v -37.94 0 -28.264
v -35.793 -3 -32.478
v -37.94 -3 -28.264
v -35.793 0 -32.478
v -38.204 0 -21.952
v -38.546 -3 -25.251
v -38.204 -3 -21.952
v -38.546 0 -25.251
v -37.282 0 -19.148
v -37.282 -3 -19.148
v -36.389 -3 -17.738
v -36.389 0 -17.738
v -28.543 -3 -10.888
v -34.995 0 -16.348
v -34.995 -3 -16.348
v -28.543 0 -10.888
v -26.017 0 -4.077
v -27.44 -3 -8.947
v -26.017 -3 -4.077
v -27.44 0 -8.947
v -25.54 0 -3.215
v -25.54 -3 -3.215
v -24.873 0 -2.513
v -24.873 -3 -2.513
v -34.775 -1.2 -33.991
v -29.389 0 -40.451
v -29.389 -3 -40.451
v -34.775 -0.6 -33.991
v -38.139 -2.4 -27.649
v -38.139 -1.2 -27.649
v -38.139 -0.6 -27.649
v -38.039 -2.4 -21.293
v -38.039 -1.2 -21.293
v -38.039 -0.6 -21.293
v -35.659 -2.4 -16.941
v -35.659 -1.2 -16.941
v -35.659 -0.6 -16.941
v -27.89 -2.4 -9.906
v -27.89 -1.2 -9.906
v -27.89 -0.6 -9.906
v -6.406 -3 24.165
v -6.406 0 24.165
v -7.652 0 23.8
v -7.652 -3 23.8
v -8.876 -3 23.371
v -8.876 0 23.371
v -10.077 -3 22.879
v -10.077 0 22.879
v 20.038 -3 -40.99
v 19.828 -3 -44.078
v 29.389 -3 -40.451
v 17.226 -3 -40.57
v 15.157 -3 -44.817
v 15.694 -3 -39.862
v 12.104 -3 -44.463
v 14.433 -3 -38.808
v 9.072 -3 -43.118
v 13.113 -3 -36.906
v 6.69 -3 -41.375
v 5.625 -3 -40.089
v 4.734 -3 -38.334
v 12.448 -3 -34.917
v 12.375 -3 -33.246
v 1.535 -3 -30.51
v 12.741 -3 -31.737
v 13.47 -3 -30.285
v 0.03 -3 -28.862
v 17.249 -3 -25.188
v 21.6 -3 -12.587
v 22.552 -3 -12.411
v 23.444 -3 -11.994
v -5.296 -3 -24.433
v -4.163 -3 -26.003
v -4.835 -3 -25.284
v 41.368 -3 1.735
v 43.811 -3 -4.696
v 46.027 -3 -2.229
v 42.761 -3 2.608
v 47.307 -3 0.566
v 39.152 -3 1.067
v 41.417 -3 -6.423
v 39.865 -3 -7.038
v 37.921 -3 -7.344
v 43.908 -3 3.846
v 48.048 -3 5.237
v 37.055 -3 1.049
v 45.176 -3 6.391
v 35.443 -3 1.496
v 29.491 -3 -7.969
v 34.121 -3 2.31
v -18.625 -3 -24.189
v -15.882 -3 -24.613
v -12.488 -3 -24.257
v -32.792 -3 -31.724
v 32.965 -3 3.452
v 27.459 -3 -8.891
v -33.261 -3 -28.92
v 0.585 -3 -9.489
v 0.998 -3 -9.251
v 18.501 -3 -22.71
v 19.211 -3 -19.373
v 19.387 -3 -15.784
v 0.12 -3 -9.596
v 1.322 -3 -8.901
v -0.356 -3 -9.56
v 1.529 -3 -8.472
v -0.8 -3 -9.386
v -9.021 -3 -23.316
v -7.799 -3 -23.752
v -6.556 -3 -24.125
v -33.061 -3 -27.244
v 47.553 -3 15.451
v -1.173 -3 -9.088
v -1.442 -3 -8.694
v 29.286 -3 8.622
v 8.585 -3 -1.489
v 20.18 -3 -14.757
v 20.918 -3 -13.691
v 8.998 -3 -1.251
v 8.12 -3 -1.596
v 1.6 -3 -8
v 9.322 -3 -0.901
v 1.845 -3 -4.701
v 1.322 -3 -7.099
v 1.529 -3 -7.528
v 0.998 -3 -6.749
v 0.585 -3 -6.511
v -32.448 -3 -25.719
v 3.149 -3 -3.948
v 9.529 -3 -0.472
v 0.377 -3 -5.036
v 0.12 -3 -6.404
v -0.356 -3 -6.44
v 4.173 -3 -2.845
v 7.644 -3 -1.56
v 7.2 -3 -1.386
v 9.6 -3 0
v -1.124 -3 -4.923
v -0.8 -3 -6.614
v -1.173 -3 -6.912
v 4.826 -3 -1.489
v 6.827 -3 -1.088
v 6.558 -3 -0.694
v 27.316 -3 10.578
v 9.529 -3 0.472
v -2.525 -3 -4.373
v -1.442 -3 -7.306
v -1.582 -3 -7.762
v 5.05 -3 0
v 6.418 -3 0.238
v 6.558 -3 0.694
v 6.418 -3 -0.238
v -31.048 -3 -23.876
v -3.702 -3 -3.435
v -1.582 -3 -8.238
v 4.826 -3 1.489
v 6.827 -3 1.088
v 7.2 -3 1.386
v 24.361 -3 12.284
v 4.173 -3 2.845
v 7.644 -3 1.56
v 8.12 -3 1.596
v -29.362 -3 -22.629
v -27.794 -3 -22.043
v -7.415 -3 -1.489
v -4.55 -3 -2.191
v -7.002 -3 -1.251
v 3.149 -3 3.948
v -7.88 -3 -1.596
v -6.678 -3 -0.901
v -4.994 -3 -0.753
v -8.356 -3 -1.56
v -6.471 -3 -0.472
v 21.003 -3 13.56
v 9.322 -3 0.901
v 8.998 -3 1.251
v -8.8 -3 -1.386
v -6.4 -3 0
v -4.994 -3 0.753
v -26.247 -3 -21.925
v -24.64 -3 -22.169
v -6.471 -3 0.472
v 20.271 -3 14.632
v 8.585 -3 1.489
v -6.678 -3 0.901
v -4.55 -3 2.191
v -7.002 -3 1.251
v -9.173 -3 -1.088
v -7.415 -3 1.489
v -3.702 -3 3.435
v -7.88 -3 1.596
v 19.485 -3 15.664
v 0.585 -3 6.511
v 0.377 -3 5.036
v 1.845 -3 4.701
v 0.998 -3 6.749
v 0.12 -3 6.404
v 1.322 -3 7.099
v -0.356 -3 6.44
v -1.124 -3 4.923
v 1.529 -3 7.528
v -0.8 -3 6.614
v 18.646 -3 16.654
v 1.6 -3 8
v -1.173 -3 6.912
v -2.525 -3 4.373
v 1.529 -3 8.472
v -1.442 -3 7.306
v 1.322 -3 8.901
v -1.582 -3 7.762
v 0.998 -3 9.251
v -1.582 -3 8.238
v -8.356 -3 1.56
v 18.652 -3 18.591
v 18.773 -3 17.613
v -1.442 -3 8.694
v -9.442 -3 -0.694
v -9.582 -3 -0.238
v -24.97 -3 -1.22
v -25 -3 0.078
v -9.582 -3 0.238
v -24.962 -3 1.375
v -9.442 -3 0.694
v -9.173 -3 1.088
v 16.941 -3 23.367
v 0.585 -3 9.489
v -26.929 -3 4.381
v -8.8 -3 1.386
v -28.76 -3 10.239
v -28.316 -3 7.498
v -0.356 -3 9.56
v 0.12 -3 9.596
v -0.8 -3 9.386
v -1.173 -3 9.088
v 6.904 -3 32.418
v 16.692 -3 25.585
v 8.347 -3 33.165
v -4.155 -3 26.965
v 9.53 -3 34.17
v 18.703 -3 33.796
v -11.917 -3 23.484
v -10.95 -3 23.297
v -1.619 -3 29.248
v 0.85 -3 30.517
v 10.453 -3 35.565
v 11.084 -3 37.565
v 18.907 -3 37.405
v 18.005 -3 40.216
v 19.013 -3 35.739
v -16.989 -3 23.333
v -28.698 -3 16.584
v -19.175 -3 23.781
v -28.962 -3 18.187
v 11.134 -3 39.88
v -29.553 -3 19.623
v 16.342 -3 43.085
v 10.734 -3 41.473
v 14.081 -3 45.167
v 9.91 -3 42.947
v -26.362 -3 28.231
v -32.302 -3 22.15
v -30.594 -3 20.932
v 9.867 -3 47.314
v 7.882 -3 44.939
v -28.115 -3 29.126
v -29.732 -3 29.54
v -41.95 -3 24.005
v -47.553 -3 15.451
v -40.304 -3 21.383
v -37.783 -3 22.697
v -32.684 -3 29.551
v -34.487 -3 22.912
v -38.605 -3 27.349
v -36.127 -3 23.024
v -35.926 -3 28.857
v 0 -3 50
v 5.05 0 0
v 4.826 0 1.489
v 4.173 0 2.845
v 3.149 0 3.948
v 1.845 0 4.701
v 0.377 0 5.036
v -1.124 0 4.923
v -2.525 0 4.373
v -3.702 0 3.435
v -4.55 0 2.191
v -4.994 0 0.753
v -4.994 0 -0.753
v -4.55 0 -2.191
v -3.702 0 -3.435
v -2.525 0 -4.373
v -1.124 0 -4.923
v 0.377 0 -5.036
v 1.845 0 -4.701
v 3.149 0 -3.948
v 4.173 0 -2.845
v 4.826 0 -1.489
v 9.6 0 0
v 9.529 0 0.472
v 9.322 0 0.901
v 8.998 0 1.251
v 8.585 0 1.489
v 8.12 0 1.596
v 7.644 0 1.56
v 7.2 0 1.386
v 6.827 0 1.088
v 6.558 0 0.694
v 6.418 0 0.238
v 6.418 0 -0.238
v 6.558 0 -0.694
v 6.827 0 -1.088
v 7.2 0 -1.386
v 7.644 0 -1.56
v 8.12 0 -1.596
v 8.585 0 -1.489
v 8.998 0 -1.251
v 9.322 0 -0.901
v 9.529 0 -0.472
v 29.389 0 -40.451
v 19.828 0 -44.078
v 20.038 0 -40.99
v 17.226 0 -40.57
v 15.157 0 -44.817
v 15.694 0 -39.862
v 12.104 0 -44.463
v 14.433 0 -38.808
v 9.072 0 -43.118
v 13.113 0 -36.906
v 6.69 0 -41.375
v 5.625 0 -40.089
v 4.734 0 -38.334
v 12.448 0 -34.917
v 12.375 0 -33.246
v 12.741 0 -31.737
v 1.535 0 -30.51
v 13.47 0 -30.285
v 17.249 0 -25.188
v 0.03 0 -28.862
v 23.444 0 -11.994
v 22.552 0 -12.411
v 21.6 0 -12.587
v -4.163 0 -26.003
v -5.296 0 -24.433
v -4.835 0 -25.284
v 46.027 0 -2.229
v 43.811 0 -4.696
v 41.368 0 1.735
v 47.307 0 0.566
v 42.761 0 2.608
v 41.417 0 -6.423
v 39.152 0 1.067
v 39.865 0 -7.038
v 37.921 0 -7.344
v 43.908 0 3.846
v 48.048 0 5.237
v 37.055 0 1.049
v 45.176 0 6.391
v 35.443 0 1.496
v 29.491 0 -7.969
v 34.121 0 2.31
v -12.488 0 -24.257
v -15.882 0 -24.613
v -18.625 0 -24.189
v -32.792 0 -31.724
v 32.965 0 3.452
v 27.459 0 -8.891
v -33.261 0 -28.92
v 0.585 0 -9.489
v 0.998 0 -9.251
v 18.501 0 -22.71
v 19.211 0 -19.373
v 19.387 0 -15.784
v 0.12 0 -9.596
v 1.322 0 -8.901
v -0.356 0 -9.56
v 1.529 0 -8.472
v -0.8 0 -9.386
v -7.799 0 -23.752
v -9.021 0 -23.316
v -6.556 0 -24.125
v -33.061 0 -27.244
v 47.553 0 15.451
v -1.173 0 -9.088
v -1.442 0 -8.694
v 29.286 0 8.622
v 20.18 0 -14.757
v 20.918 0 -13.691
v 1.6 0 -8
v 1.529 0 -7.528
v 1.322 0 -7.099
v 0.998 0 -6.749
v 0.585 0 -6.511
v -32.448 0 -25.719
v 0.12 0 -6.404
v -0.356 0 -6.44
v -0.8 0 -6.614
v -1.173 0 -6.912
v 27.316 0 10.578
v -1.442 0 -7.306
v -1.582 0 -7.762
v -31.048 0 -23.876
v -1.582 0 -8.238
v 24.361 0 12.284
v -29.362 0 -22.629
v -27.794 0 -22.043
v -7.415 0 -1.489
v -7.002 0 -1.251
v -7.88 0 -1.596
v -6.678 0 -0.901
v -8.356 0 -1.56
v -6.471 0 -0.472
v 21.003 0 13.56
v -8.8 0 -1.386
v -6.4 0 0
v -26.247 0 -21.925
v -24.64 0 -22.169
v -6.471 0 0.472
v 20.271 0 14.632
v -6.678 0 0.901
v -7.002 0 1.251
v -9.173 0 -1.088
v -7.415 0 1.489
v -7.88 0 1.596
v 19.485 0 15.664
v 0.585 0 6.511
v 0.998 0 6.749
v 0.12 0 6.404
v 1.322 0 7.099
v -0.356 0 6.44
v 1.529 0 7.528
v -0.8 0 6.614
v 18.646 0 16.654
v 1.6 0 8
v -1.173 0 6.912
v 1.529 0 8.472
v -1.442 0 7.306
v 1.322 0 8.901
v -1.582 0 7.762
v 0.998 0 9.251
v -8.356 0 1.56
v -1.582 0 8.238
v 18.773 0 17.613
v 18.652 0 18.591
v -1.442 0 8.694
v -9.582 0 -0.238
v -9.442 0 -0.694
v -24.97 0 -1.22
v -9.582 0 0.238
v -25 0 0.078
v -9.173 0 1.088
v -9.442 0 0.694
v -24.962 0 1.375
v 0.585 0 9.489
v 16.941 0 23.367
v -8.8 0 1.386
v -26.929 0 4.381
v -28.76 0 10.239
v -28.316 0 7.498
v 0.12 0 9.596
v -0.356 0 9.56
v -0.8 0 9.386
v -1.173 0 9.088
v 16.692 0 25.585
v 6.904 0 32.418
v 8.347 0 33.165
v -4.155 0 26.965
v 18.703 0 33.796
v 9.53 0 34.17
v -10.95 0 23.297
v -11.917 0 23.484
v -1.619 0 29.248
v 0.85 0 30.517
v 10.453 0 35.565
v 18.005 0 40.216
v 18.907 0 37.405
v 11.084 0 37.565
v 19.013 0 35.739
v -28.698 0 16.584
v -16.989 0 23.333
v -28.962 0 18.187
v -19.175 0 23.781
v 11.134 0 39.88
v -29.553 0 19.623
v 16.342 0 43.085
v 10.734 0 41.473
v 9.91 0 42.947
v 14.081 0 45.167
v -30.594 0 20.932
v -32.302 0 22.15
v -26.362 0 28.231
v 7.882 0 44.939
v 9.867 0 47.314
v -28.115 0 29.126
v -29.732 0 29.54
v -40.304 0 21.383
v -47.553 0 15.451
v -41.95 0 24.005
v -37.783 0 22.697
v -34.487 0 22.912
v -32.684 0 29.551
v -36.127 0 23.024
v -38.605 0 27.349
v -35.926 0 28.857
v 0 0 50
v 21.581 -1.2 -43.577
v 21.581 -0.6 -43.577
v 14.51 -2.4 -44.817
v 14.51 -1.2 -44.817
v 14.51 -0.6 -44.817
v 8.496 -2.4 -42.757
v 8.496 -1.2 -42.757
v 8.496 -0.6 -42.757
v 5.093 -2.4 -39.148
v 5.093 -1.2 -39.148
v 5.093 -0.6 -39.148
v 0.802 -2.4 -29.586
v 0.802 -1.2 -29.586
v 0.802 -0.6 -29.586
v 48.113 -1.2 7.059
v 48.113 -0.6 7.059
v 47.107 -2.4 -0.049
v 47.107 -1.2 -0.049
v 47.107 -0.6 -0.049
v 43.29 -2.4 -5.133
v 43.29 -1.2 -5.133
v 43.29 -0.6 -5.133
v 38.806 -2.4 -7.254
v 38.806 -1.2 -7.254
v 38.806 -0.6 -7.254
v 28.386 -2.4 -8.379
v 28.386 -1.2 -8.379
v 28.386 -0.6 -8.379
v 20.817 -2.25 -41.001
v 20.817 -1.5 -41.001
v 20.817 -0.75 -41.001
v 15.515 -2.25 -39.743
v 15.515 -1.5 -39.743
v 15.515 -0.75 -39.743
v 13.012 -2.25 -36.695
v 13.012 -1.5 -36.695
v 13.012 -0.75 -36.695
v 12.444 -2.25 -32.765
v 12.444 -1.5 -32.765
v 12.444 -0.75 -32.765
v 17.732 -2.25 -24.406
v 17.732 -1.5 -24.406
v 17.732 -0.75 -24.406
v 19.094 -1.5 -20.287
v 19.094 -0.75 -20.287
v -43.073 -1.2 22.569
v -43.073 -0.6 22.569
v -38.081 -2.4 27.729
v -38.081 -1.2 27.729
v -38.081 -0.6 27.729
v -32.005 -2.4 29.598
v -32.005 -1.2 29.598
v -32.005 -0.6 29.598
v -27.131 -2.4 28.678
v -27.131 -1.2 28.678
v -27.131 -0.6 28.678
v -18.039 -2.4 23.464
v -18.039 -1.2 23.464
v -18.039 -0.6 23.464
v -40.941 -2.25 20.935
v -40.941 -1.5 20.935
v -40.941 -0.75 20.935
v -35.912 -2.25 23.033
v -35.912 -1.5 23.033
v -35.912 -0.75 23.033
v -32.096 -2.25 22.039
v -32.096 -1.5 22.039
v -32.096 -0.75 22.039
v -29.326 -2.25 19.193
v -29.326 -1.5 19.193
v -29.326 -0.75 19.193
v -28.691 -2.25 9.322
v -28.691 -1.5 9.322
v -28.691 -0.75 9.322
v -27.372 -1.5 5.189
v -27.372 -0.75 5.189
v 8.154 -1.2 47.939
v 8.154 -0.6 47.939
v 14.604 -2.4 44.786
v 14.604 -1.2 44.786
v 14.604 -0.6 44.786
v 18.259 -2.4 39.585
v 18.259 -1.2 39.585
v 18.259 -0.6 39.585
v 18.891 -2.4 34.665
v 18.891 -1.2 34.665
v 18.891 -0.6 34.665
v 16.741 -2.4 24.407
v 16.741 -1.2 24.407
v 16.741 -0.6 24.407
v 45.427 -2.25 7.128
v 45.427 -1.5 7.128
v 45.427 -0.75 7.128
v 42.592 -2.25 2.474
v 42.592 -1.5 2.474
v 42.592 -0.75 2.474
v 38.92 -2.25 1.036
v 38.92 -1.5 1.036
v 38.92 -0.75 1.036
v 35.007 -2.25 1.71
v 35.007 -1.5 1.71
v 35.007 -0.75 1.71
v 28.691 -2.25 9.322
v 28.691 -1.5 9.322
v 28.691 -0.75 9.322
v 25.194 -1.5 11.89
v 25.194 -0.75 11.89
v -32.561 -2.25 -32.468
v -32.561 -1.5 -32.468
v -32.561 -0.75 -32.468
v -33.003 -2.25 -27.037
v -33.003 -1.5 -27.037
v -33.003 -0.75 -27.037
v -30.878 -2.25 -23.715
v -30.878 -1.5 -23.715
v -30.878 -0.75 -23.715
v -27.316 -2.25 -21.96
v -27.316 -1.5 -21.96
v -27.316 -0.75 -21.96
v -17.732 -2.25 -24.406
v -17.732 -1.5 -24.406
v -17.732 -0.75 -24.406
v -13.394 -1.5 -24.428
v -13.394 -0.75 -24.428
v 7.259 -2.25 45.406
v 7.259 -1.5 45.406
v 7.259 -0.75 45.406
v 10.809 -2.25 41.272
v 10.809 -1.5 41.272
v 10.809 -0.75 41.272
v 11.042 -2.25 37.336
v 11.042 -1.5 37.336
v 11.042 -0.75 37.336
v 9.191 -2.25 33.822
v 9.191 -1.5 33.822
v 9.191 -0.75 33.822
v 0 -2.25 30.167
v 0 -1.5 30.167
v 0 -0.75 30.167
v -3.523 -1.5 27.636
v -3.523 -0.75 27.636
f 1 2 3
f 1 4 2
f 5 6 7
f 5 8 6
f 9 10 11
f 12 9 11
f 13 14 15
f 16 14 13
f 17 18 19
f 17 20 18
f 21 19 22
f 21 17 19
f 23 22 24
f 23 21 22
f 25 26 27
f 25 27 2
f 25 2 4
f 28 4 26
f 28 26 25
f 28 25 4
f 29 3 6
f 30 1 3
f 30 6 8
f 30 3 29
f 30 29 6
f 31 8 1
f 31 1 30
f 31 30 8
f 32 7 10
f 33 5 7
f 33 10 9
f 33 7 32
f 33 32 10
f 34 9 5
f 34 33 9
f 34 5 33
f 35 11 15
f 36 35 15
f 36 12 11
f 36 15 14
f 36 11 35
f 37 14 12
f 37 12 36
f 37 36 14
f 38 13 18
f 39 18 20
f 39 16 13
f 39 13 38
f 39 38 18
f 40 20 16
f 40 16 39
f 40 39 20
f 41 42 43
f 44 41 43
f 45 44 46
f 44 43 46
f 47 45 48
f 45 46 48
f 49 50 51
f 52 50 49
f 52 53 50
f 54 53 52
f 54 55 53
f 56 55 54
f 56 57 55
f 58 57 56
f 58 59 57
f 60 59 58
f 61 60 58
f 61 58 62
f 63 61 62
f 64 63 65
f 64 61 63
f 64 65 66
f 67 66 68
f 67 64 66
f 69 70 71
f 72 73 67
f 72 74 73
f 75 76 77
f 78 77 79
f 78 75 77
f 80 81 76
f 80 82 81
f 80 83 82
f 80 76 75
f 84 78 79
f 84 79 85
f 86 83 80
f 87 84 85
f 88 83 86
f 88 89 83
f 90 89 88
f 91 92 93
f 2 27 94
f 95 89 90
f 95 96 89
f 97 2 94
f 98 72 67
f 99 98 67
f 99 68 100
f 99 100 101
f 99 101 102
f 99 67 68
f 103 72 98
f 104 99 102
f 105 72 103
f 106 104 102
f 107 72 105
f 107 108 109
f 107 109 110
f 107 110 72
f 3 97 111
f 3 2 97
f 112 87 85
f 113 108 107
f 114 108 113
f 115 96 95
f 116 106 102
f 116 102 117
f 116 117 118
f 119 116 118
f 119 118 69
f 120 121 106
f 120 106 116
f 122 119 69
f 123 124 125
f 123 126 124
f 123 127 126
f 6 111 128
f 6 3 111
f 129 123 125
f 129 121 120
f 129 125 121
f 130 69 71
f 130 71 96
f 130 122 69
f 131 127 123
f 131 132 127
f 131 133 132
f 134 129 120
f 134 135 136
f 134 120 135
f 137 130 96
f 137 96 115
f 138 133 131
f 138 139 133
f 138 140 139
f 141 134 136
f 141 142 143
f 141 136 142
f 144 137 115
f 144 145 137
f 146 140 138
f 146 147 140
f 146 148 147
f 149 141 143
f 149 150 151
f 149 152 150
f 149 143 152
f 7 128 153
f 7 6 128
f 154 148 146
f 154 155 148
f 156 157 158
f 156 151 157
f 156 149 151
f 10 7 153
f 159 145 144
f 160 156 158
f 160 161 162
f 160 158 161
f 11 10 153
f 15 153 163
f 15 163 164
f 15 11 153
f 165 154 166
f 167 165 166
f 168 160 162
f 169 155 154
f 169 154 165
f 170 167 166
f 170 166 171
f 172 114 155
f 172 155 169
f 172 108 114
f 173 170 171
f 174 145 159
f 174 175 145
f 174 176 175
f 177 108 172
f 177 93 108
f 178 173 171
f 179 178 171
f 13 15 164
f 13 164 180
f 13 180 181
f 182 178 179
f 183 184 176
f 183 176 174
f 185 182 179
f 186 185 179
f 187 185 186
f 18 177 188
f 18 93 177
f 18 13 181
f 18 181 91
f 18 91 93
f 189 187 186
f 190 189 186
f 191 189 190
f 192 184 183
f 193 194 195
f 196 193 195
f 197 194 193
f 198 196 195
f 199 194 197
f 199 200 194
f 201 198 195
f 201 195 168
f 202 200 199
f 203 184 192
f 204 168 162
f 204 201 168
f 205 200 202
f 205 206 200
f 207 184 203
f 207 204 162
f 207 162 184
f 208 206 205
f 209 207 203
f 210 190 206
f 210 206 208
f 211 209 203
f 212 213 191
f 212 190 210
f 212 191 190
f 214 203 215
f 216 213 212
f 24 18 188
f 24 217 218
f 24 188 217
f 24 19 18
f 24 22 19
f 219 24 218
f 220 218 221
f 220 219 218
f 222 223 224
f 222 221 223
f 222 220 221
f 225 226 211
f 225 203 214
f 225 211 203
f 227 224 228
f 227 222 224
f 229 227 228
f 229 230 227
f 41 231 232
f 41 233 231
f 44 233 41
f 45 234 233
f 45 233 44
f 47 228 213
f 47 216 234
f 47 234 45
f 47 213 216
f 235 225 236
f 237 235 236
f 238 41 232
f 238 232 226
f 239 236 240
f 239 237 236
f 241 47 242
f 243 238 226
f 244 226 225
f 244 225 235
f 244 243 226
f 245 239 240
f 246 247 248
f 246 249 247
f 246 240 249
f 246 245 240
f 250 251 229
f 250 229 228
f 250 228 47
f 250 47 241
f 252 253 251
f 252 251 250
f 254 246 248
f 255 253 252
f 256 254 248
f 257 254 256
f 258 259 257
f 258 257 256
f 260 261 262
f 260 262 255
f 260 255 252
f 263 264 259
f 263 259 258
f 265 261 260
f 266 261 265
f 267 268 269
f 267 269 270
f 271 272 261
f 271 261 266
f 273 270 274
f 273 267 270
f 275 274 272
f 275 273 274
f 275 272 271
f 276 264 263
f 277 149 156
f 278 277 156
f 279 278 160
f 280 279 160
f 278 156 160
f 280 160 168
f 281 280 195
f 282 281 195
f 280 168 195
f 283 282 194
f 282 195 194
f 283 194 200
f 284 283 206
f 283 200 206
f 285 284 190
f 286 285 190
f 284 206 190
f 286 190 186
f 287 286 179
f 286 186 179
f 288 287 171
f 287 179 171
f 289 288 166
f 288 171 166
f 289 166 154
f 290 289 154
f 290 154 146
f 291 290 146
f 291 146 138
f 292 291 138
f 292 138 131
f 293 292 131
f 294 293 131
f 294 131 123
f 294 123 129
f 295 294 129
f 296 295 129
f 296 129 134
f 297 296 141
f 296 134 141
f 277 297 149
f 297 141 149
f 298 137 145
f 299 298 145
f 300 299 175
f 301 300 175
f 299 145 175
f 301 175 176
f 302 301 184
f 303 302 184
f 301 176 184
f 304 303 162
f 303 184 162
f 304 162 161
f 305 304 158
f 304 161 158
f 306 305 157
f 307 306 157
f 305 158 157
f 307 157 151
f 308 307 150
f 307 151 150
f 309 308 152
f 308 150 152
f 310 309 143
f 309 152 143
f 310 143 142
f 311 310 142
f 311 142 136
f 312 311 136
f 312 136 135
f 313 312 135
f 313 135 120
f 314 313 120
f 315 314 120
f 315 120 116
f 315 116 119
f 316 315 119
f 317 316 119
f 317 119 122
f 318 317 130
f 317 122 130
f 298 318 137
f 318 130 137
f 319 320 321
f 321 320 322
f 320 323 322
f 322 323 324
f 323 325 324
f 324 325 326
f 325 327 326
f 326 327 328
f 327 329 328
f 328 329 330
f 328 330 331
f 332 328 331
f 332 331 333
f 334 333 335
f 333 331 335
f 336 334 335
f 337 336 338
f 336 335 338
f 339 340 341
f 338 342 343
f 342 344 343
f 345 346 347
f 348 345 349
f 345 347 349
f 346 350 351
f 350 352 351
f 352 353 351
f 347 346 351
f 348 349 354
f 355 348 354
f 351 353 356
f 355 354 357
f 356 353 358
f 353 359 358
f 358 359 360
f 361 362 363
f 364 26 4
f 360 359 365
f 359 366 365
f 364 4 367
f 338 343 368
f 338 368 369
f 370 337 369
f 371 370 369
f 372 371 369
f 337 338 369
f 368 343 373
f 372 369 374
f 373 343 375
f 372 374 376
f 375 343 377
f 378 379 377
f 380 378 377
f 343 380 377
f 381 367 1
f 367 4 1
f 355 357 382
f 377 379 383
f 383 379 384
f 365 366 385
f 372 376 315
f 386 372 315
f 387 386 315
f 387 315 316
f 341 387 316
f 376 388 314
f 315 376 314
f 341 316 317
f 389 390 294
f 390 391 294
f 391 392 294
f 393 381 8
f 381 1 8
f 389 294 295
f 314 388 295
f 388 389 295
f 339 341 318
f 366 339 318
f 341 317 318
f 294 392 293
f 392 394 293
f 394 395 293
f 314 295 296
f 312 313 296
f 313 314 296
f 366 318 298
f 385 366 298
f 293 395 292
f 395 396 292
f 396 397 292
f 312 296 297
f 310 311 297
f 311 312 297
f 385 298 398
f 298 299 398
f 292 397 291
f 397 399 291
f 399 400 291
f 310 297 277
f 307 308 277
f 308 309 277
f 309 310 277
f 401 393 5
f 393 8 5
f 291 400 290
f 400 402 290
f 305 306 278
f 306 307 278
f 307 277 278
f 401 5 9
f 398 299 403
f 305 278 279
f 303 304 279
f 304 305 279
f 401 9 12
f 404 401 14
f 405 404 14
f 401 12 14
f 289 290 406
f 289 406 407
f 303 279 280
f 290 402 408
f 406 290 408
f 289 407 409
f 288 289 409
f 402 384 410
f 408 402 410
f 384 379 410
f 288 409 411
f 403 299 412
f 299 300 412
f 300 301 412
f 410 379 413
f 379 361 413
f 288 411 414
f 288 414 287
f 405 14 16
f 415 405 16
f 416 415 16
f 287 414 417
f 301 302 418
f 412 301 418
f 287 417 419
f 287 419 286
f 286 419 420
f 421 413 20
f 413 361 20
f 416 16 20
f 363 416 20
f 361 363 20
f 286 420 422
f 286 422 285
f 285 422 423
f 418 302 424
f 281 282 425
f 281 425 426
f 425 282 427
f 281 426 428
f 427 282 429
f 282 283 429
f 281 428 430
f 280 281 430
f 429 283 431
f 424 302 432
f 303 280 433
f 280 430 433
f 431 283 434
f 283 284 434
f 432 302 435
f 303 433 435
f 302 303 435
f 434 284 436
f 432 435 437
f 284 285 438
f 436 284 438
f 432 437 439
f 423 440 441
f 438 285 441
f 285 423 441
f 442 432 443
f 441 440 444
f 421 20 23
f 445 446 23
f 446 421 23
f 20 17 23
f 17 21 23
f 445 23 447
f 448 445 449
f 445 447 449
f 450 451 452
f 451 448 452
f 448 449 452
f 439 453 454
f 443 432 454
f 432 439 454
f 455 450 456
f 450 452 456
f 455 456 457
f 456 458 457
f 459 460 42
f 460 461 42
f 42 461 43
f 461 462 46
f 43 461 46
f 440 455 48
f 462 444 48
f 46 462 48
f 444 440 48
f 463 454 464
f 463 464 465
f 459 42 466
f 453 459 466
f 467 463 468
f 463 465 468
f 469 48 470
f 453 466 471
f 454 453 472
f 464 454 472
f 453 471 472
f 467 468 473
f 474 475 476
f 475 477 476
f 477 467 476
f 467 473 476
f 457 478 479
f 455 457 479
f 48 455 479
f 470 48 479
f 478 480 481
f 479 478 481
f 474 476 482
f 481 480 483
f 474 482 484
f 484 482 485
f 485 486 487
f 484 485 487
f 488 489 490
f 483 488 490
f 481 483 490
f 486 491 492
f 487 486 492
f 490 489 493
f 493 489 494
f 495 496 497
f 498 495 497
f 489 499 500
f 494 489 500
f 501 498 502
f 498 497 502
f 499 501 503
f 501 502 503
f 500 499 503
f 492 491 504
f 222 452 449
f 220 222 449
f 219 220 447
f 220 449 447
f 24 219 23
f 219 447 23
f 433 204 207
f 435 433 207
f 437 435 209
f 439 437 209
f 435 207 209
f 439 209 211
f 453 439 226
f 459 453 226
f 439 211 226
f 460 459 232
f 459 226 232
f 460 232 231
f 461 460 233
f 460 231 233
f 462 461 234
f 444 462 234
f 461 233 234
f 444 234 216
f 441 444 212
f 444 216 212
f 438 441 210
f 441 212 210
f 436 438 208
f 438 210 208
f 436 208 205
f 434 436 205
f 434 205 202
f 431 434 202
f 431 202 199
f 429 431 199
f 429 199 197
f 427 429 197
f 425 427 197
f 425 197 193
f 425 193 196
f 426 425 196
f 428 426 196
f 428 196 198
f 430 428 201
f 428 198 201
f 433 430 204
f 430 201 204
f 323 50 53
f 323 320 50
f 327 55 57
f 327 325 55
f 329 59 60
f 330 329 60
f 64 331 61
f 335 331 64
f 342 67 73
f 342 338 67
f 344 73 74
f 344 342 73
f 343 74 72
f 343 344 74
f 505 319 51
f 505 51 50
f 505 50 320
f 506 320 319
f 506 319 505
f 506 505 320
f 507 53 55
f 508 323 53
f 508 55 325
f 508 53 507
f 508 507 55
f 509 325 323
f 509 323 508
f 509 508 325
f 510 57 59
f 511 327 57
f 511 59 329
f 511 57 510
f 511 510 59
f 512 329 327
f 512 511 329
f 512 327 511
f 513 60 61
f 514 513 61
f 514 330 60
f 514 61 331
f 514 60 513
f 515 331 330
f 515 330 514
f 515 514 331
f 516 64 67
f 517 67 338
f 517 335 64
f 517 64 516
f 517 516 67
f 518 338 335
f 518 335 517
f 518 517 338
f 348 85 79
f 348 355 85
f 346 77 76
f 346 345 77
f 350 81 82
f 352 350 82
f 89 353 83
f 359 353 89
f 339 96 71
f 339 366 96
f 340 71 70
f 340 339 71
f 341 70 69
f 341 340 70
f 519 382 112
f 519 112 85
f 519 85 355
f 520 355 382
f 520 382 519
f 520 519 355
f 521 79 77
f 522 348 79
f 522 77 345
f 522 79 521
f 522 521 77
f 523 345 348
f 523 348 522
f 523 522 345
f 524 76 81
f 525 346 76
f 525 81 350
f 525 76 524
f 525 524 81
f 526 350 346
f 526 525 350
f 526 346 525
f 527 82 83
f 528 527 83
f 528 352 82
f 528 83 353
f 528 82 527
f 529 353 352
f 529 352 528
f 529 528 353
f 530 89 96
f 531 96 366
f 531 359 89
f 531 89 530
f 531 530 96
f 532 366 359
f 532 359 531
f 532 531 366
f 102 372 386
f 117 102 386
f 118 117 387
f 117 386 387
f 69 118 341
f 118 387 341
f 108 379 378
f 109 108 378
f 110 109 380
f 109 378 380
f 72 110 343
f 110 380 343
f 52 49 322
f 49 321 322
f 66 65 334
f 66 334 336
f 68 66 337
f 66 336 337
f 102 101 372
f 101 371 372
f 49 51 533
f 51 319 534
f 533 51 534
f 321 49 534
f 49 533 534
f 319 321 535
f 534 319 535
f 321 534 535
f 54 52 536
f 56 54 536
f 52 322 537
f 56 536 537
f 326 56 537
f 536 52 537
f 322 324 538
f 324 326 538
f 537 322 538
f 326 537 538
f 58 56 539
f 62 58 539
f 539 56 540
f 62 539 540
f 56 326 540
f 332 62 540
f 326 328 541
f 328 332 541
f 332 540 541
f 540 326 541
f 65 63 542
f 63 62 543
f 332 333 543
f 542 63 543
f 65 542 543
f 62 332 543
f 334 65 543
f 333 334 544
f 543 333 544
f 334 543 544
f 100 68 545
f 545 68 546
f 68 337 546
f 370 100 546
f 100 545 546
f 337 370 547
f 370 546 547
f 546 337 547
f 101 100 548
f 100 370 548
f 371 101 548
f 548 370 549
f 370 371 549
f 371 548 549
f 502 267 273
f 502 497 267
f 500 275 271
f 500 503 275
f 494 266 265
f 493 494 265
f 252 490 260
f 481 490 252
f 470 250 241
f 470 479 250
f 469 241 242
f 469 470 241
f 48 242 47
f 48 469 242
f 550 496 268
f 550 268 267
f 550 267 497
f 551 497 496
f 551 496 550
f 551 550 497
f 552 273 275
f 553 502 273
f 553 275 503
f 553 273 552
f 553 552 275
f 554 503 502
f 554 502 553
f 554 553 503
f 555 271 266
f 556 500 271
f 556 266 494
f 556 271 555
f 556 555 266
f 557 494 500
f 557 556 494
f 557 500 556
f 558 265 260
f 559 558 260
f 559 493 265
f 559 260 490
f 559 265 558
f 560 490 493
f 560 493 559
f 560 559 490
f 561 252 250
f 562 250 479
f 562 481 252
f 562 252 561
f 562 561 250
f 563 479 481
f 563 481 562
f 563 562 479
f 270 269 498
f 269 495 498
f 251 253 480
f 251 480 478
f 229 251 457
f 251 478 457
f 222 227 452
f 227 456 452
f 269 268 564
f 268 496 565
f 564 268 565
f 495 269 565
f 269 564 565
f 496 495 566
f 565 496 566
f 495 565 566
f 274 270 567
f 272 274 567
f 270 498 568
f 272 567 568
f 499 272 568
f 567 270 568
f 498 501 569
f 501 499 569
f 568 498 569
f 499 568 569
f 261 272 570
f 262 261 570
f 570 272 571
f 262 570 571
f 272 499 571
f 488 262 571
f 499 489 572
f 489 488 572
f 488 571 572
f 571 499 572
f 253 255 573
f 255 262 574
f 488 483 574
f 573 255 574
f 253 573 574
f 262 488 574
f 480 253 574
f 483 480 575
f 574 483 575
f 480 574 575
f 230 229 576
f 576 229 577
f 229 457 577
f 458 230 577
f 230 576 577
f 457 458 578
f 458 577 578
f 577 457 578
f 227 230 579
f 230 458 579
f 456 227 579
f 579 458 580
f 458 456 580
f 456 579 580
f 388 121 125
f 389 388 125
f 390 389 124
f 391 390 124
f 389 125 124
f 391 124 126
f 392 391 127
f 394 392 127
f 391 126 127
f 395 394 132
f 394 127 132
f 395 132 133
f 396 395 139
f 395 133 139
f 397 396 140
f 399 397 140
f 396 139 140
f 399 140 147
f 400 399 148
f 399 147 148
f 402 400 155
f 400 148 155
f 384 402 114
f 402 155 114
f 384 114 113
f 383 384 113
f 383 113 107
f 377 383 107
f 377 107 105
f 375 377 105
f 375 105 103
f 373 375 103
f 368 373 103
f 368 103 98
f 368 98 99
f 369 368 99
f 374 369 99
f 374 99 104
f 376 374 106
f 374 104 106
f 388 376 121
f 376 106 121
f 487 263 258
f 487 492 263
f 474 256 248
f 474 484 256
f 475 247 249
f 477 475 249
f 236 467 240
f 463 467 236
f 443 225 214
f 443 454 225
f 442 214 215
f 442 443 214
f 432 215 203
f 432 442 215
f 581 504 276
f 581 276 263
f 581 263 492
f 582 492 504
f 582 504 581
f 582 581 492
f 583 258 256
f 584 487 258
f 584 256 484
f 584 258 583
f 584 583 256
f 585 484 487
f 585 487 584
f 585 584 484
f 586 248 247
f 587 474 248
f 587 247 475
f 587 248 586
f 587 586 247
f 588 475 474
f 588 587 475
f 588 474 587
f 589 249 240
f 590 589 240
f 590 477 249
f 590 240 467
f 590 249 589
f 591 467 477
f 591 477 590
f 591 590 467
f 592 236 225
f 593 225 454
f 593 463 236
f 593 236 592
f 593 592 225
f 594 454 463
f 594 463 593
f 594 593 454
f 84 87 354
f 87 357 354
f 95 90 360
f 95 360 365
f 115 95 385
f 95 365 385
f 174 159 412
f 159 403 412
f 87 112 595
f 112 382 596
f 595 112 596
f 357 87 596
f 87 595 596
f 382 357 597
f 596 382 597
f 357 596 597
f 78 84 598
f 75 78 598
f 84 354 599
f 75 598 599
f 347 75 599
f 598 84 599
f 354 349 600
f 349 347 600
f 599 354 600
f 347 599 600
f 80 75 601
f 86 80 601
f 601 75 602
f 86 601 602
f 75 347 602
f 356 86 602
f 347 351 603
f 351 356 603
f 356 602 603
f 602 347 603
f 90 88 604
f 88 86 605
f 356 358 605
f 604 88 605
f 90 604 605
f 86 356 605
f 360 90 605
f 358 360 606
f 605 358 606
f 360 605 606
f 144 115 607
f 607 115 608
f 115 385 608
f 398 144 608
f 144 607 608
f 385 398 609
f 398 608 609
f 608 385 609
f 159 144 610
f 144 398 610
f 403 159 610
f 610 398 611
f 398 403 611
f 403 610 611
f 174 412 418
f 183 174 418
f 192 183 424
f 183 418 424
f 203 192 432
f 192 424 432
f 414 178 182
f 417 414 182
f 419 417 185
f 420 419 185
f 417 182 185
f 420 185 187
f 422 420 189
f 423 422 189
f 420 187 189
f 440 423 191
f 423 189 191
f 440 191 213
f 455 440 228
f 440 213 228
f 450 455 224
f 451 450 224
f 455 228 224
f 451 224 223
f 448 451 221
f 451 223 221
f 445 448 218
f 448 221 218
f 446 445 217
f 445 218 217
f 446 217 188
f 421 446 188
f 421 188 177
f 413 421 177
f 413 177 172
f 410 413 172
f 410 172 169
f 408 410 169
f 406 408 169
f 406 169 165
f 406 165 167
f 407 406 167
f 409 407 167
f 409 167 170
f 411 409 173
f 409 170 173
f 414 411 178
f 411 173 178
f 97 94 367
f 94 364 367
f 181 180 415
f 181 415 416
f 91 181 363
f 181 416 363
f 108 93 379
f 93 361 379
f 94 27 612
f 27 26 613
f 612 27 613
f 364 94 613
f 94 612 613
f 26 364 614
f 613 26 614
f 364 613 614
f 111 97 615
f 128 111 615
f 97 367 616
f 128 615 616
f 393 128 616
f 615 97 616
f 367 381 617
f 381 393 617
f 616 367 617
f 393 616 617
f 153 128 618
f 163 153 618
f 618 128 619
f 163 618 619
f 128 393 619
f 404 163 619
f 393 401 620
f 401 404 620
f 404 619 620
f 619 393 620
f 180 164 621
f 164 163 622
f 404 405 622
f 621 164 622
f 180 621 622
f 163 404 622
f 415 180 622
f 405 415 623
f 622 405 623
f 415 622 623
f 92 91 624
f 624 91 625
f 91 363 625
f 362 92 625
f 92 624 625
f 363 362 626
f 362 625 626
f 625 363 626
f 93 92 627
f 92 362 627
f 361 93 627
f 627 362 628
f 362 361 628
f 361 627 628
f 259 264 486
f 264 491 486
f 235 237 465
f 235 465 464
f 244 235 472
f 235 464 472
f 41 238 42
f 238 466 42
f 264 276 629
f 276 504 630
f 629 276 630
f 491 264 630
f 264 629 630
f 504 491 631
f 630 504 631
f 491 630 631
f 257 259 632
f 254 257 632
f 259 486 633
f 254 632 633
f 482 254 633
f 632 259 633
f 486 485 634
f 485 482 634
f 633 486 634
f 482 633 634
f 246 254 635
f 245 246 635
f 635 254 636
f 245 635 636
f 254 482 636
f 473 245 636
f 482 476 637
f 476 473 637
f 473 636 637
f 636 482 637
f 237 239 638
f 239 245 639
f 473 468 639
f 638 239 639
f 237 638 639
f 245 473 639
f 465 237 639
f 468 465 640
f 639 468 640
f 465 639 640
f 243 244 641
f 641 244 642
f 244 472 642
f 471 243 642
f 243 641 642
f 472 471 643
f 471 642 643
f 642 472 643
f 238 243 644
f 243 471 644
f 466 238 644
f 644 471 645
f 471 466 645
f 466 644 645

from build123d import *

# Parameters (mm, degrees)
F1_DEPTH = 3
F3_COUNT = 5
F4_R     = 1.6
F4_R_2   = 5.05
F5_DEPTH = 3


with BuildPart() as f1:
    # F0 (on Front) → F1 (new body)
    with BuildSketch(Plane.XZ):
        with BuildLine():
            ThreePointArc((-6.4064275077, 24.1652164606), (7.1802315771, 23.9466965258), (18.6456198428, 16.6535539954))
            add(Edge.make_bspline(
                [(0, 50), (5.4752053314, 48.9870299865), (15.1956288518, 46.1472010196), (18.4135211284, 39.657308755), (19.7986928673, 34.5709188014), (14.5438348398, 24.2751019543), (19.322329273, 19.0016283629), (18.6456198428, 16.6535539954)],
                knots=[0, 0, 0, 0, 0.2669854229, 0.4379263337, 0.5889285558, 0.8084269905, 1, 1, 1, 1], degree=3))
            add(Edge.make_bspline(
                [(0, 50), (6.0767503455, 46.164855361), (12.3433645668, 43.2573090849), (10.5437457987, 31.9559472859), (-0.898028492, 31.2765938229), (-4.5042521994, 26.6763451486), (-6.4064275077, 24.1652164606)],
                knots=[0, 0, 0, 0, 0.29590245, 0.5151018296, 0.7647825177, 1, 1, 1, 1], degree=3))
        make_face()
        with BuildLine():
            ThreePointArc((-6.4064275077, 24.1652164606), (-15.2453158758, -19.8136403482), (25, 0))
            ThreePointArc((25, 0), (23.3574452378, 8.9123370653), (18.6456198428, 16.6535539954))
            ThreePointArc((18.6456198428, 16.6535539954), (7.1802315771, 23.9466965258), (-6.4064275077, 24.1652164606))
        make_face()
    extrude(amount=F1_DEPTH)

    # F3: F1 ×5 about axis
    f3_axis = Axis((0, 4.5021800324, 0), (0, 1, 0))


with BuildPart() as f1_1:
    add(f1.part)
    for i in range(1, F3_COUNT):
        add(f1.part.rotate(f3_axis, i * 360 / F3_COUNT))

    # F4 (on face) → F5 (cut, through all)
    with BuildSketch(Plane.XZ.offset(3)):
        with Locations((0, 8)):
            Circle(F4_R)
        with Locations((-8, 0)):
            Circle(F4_R)
        with Locations((0, -8)):
            Circle(F4_R)
        with Locations((8, 0)):
            Circle(F4_R)
        Circle(F4_R_2)
    extrude(amount=-F5_DEPTH, mode=Mode.SUBTRACT)


solid = f1_1.part
